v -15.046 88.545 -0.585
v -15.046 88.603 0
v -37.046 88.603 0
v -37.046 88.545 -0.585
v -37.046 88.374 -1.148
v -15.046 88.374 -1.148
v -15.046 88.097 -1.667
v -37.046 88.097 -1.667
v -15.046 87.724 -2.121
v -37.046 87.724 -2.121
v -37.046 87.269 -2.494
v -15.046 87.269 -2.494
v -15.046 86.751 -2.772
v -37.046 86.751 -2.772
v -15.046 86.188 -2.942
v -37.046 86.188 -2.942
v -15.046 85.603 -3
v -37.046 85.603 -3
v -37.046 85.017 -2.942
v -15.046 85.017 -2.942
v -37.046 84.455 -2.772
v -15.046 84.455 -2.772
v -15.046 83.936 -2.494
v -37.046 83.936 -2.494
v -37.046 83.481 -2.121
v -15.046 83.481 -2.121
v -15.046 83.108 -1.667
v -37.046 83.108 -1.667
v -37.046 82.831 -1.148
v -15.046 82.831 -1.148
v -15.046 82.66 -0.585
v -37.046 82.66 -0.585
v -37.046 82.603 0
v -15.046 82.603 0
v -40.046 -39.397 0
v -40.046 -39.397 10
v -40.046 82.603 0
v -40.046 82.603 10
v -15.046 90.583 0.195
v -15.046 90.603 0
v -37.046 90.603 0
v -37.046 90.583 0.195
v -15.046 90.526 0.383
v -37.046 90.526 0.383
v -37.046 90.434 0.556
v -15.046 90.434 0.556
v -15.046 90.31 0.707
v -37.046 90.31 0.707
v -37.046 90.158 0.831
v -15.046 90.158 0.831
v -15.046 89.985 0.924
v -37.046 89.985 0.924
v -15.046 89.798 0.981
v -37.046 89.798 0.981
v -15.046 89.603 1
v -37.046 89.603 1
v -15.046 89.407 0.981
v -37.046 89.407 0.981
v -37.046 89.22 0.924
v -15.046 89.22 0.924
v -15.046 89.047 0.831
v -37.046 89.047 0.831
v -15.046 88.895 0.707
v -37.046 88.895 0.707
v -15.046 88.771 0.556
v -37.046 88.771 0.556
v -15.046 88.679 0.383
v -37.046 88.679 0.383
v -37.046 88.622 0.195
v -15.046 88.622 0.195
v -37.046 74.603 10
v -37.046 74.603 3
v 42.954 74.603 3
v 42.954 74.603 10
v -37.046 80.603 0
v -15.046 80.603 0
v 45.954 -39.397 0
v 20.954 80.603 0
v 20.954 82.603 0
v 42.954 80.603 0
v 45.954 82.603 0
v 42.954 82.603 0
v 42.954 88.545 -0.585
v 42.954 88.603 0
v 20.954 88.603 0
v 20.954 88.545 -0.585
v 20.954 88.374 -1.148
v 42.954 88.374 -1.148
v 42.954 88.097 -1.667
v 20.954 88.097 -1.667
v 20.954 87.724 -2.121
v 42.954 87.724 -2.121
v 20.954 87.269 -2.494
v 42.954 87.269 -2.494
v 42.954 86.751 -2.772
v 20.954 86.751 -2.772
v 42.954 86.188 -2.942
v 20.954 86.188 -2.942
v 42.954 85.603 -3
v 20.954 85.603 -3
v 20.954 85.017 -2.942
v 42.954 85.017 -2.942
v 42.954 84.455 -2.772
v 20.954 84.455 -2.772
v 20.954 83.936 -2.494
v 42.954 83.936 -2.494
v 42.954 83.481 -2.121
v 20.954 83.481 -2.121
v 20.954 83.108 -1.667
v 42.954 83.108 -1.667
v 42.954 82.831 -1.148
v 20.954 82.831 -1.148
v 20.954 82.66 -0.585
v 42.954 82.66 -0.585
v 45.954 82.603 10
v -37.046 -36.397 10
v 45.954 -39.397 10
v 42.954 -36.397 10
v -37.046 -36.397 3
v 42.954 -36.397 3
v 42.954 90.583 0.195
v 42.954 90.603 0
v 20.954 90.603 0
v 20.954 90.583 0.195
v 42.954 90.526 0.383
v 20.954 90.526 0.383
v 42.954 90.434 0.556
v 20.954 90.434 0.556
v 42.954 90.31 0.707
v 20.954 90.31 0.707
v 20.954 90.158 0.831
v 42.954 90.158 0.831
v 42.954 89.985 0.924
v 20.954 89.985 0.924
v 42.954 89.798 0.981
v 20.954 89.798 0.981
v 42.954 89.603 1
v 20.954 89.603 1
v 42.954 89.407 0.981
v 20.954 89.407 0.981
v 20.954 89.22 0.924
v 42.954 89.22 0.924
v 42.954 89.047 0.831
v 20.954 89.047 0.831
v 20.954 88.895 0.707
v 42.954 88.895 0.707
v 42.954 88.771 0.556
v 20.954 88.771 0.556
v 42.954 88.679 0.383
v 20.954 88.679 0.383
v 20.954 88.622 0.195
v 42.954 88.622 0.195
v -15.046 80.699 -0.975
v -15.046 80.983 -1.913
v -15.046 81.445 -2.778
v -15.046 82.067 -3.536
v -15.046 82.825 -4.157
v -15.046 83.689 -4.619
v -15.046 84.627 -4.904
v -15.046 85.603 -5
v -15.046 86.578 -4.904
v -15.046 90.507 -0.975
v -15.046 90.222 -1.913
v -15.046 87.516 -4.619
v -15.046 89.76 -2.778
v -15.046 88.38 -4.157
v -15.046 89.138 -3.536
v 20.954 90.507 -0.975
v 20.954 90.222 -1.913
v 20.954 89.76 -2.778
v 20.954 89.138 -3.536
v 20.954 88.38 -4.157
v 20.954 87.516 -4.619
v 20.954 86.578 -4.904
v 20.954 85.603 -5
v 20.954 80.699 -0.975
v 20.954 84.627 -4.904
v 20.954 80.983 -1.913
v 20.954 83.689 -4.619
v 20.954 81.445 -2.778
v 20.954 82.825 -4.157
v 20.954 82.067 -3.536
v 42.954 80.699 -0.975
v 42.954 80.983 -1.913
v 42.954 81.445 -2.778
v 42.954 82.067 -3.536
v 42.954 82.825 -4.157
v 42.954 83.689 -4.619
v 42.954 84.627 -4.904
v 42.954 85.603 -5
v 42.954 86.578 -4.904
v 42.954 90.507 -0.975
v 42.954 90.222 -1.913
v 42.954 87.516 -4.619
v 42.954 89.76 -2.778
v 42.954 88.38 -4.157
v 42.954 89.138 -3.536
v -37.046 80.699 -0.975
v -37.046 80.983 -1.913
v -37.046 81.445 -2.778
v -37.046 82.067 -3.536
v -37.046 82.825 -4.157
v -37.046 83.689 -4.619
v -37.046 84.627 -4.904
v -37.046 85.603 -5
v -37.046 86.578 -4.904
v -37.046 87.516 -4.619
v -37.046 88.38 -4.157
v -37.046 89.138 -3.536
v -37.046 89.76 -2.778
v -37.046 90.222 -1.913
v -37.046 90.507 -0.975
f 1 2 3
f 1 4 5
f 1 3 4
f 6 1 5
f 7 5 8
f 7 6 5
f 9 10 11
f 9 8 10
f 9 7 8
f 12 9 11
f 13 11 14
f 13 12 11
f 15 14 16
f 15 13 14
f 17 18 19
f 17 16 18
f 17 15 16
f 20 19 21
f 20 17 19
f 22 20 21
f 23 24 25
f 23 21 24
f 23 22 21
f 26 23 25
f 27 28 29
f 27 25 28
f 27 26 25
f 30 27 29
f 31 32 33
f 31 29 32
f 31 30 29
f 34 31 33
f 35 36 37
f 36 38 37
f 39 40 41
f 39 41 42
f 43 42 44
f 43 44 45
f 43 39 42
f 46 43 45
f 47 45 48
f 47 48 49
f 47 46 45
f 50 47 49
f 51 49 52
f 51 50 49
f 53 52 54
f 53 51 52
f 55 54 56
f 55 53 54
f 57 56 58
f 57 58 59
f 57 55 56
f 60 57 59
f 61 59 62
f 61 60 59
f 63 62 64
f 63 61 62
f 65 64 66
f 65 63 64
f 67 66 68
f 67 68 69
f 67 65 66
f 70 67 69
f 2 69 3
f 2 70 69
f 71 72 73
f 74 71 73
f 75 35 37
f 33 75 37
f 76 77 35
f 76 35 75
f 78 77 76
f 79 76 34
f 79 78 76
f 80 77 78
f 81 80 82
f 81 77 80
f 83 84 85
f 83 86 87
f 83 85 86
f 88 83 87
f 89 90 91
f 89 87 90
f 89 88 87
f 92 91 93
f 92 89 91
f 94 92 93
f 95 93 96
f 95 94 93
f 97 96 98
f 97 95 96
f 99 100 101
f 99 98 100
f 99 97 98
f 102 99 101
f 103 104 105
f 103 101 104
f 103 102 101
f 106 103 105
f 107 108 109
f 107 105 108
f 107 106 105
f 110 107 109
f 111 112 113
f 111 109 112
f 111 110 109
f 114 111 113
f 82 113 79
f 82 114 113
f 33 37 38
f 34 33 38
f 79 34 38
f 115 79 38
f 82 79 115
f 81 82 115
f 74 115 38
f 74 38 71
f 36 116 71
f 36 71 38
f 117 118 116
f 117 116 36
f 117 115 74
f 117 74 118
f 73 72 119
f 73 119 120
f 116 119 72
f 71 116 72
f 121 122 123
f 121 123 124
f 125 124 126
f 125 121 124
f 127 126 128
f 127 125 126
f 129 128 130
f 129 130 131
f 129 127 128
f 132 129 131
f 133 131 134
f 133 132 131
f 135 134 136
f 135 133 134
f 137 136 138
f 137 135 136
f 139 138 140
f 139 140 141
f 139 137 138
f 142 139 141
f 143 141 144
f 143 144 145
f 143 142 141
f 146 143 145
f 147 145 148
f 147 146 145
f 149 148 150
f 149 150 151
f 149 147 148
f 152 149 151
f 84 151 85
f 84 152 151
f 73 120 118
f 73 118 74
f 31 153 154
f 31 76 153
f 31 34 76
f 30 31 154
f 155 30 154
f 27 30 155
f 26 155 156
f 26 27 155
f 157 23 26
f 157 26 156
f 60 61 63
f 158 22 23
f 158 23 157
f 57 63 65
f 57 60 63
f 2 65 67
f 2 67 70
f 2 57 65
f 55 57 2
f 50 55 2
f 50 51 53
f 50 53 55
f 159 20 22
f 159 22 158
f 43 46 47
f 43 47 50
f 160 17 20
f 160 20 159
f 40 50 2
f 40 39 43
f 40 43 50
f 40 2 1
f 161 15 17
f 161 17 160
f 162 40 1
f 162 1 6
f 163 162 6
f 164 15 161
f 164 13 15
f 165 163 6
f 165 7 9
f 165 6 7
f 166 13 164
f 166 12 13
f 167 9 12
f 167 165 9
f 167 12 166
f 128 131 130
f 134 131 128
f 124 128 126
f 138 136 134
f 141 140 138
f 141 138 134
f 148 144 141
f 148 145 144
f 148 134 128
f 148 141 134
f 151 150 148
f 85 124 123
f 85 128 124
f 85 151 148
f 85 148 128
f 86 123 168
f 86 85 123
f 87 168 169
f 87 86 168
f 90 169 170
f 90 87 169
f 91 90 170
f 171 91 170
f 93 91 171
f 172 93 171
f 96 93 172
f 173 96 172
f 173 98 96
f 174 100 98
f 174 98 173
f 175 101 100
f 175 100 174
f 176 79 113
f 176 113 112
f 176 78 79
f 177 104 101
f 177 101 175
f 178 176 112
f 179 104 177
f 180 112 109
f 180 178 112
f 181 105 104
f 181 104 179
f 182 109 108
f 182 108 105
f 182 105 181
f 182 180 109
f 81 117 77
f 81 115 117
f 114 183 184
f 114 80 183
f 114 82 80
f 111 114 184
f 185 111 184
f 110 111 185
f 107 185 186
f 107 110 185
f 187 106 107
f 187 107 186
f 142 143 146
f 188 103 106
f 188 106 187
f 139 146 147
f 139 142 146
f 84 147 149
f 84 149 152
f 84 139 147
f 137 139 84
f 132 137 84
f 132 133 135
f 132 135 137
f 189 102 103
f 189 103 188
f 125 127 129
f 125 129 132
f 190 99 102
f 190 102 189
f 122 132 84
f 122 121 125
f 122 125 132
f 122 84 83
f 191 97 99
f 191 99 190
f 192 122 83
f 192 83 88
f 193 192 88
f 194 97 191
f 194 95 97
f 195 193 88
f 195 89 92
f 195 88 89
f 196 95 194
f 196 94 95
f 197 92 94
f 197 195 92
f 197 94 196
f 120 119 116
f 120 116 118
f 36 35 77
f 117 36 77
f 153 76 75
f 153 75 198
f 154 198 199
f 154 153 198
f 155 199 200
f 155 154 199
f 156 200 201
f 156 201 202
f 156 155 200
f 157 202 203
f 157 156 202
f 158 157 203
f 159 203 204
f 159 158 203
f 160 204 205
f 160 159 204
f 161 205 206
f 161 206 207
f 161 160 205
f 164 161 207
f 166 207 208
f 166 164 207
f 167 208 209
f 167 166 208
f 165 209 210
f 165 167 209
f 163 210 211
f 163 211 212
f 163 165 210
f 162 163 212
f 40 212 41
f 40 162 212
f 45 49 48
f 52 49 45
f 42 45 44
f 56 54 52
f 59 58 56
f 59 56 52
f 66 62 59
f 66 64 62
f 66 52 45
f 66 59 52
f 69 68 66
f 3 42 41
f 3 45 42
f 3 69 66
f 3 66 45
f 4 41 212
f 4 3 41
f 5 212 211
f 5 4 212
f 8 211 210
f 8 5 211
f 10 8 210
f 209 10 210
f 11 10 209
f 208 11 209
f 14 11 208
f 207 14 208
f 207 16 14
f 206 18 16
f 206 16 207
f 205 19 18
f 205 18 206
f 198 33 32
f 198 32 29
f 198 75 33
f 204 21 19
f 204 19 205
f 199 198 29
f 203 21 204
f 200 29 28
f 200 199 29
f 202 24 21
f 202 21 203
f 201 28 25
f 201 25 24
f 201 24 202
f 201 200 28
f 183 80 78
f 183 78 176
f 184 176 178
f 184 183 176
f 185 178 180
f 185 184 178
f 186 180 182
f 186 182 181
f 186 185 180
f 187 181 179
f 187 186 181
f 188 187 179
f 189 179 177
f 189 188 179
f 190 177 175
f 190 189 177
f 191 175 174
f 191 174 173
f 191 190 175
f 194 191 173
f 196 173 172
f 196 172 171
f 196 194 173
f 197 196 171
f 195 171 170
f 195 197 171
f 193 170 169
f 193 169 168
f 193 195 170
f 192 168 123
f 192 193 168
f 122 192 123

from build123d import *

# Parameters (mm, degrees)
EKRAN_TABAN_W               = 86
EKRAN_TABAN_H               = 117
EKRAN_TABAN_W_2             = 80
EKRAN_TABAN_H_2             = 111
Y_KSEKLIK_EKSTR_ZYON1_DEPTH = 10
EKRAN_TABAN_2_W             = 80
EKRAN_TABAN_2_H             = 111
Y_KSEKLIK_EKSTR_ZYON2_DEPTH = 3
Y_KSEKLIK_EKSTR_ZYON3_DEPTH = 86
IZIM6_W                     = 3
IZIM6_H                     = 15
IZIM6_W_2                   = 36
KES_EKSTR_ZYON3_DEPTH       = 10
IZIM8_W                     = 3
IZIM8_H                     = 5
IZIM8_W_2                   = 36
KES_EKSTR_ZYON5_DEPTH       = 2


with BuildPart() as part:
    # ekran_taban → Yükseklik-Ekstrüzyon1 (new body)
    with BuildSketch(Plane.XY):
        with Locations((2.953774531, 19.102589183)):
            Rectangle(EKRAN_TABAN_W, EKRAN_TABAN_H)
        with Locations((2.953774531, 19.102589183)):
            Rectangle(EKRAN_TABAN_W_2, EKRAN_TABAN_H_2, mode=Mode.SUBTRACT)
    extrude(amount=Y_KSEKLIK_EKSTR_ZYON1_DEPTH)

    # ekran_taban<2> → Yükseklik-Ekstrüzyon2 (add)
    with BuildSketch(Plane.XY):
        with Locations((2.953774531, 19.102589183)):
            Rectangle(EKRAN_TABAN_2_W, EKRAN_TABAN_2_H)
    extrude(amount=Y_KSEKLIK_EKSTR_ZYON2_DEPTH)

    # Çizim3 → Yükseklik-Ekstrüzyon3 (add)
    with BuildSketch(Plane(origin=(45.953774531, 0, 0), x_dir=(0, 0, -1), z_dir=(1, 0, 0))):
        with BuildLine():
            Line((-10, 77.602589183), (0, 77.602589183))
            Line((0, 77.602589183), (0, 80.602589183))
            ThreePointArc((0, 80.602589183), (5, 85.602589183), (0, 90.602589183))
            ThreePointArc((0, 90.602589183), (-1, 89.602589183), (0, 88.602589183))
            ThreePointArc((0, 88.602589183), (3, 85.602589183), (0, 82.602589183))
            Line((0, 82.602589183), (-10, 82.602589183))
            Line((-10, 82.602589183), (-10, 77.602589183))
        make_face()
    extrude(amount=-Y_KSEKLIK_EKSTR_ZYON3_DEPTH)

    # Çizim6 → Kes-Ekstrüzyon3 (cut)
    with BuildSketch(Plane(origin=(0, 82.602589183, 0), x_dir=(1, 0, 0), z_dir=(0, 1, 0))):
        with Locations((-38.546225469, -2.5)):
            Rectangle(IZIM6_W, IZIM6_H)
        with Locations((2.953774531, -2.5)):
            Rectangle(IZIM6_W_2, IZIM6_H)
        with Locations((44.453774531, -2.5)):
            Rectangle(IZIM6_W, IZIM6_H)
    extrude(amount=KES_EKSTR_ZYON3_DEPTH, mode=Mode.SUBTRACT)

    # Çizim8 → Kes-Ekstrüzyon5 (cut)
    with BuildSketch(Plane(origin=(0, 82.602589183, 0), x_dir=(1, 0, 0), z_dir=(0, 1, 0))):
        with Locations((-38.546225469, 2.5)):
            Rectangle(IZIM8_W, IZIM8_H)
        with Locations((44.453774531, 2.5)):
            Rectangle(IZIM8_W, IZIM8_H)
        with Locations((2.953774531, 2.5)):
            Rectangle(IZIM8_W_2, IZIM8_H)
    extrude(amount=-KES_EKSTR_ZYON5_DEPTH, mode=Mode.SUBTRACT)


solid = part.part
